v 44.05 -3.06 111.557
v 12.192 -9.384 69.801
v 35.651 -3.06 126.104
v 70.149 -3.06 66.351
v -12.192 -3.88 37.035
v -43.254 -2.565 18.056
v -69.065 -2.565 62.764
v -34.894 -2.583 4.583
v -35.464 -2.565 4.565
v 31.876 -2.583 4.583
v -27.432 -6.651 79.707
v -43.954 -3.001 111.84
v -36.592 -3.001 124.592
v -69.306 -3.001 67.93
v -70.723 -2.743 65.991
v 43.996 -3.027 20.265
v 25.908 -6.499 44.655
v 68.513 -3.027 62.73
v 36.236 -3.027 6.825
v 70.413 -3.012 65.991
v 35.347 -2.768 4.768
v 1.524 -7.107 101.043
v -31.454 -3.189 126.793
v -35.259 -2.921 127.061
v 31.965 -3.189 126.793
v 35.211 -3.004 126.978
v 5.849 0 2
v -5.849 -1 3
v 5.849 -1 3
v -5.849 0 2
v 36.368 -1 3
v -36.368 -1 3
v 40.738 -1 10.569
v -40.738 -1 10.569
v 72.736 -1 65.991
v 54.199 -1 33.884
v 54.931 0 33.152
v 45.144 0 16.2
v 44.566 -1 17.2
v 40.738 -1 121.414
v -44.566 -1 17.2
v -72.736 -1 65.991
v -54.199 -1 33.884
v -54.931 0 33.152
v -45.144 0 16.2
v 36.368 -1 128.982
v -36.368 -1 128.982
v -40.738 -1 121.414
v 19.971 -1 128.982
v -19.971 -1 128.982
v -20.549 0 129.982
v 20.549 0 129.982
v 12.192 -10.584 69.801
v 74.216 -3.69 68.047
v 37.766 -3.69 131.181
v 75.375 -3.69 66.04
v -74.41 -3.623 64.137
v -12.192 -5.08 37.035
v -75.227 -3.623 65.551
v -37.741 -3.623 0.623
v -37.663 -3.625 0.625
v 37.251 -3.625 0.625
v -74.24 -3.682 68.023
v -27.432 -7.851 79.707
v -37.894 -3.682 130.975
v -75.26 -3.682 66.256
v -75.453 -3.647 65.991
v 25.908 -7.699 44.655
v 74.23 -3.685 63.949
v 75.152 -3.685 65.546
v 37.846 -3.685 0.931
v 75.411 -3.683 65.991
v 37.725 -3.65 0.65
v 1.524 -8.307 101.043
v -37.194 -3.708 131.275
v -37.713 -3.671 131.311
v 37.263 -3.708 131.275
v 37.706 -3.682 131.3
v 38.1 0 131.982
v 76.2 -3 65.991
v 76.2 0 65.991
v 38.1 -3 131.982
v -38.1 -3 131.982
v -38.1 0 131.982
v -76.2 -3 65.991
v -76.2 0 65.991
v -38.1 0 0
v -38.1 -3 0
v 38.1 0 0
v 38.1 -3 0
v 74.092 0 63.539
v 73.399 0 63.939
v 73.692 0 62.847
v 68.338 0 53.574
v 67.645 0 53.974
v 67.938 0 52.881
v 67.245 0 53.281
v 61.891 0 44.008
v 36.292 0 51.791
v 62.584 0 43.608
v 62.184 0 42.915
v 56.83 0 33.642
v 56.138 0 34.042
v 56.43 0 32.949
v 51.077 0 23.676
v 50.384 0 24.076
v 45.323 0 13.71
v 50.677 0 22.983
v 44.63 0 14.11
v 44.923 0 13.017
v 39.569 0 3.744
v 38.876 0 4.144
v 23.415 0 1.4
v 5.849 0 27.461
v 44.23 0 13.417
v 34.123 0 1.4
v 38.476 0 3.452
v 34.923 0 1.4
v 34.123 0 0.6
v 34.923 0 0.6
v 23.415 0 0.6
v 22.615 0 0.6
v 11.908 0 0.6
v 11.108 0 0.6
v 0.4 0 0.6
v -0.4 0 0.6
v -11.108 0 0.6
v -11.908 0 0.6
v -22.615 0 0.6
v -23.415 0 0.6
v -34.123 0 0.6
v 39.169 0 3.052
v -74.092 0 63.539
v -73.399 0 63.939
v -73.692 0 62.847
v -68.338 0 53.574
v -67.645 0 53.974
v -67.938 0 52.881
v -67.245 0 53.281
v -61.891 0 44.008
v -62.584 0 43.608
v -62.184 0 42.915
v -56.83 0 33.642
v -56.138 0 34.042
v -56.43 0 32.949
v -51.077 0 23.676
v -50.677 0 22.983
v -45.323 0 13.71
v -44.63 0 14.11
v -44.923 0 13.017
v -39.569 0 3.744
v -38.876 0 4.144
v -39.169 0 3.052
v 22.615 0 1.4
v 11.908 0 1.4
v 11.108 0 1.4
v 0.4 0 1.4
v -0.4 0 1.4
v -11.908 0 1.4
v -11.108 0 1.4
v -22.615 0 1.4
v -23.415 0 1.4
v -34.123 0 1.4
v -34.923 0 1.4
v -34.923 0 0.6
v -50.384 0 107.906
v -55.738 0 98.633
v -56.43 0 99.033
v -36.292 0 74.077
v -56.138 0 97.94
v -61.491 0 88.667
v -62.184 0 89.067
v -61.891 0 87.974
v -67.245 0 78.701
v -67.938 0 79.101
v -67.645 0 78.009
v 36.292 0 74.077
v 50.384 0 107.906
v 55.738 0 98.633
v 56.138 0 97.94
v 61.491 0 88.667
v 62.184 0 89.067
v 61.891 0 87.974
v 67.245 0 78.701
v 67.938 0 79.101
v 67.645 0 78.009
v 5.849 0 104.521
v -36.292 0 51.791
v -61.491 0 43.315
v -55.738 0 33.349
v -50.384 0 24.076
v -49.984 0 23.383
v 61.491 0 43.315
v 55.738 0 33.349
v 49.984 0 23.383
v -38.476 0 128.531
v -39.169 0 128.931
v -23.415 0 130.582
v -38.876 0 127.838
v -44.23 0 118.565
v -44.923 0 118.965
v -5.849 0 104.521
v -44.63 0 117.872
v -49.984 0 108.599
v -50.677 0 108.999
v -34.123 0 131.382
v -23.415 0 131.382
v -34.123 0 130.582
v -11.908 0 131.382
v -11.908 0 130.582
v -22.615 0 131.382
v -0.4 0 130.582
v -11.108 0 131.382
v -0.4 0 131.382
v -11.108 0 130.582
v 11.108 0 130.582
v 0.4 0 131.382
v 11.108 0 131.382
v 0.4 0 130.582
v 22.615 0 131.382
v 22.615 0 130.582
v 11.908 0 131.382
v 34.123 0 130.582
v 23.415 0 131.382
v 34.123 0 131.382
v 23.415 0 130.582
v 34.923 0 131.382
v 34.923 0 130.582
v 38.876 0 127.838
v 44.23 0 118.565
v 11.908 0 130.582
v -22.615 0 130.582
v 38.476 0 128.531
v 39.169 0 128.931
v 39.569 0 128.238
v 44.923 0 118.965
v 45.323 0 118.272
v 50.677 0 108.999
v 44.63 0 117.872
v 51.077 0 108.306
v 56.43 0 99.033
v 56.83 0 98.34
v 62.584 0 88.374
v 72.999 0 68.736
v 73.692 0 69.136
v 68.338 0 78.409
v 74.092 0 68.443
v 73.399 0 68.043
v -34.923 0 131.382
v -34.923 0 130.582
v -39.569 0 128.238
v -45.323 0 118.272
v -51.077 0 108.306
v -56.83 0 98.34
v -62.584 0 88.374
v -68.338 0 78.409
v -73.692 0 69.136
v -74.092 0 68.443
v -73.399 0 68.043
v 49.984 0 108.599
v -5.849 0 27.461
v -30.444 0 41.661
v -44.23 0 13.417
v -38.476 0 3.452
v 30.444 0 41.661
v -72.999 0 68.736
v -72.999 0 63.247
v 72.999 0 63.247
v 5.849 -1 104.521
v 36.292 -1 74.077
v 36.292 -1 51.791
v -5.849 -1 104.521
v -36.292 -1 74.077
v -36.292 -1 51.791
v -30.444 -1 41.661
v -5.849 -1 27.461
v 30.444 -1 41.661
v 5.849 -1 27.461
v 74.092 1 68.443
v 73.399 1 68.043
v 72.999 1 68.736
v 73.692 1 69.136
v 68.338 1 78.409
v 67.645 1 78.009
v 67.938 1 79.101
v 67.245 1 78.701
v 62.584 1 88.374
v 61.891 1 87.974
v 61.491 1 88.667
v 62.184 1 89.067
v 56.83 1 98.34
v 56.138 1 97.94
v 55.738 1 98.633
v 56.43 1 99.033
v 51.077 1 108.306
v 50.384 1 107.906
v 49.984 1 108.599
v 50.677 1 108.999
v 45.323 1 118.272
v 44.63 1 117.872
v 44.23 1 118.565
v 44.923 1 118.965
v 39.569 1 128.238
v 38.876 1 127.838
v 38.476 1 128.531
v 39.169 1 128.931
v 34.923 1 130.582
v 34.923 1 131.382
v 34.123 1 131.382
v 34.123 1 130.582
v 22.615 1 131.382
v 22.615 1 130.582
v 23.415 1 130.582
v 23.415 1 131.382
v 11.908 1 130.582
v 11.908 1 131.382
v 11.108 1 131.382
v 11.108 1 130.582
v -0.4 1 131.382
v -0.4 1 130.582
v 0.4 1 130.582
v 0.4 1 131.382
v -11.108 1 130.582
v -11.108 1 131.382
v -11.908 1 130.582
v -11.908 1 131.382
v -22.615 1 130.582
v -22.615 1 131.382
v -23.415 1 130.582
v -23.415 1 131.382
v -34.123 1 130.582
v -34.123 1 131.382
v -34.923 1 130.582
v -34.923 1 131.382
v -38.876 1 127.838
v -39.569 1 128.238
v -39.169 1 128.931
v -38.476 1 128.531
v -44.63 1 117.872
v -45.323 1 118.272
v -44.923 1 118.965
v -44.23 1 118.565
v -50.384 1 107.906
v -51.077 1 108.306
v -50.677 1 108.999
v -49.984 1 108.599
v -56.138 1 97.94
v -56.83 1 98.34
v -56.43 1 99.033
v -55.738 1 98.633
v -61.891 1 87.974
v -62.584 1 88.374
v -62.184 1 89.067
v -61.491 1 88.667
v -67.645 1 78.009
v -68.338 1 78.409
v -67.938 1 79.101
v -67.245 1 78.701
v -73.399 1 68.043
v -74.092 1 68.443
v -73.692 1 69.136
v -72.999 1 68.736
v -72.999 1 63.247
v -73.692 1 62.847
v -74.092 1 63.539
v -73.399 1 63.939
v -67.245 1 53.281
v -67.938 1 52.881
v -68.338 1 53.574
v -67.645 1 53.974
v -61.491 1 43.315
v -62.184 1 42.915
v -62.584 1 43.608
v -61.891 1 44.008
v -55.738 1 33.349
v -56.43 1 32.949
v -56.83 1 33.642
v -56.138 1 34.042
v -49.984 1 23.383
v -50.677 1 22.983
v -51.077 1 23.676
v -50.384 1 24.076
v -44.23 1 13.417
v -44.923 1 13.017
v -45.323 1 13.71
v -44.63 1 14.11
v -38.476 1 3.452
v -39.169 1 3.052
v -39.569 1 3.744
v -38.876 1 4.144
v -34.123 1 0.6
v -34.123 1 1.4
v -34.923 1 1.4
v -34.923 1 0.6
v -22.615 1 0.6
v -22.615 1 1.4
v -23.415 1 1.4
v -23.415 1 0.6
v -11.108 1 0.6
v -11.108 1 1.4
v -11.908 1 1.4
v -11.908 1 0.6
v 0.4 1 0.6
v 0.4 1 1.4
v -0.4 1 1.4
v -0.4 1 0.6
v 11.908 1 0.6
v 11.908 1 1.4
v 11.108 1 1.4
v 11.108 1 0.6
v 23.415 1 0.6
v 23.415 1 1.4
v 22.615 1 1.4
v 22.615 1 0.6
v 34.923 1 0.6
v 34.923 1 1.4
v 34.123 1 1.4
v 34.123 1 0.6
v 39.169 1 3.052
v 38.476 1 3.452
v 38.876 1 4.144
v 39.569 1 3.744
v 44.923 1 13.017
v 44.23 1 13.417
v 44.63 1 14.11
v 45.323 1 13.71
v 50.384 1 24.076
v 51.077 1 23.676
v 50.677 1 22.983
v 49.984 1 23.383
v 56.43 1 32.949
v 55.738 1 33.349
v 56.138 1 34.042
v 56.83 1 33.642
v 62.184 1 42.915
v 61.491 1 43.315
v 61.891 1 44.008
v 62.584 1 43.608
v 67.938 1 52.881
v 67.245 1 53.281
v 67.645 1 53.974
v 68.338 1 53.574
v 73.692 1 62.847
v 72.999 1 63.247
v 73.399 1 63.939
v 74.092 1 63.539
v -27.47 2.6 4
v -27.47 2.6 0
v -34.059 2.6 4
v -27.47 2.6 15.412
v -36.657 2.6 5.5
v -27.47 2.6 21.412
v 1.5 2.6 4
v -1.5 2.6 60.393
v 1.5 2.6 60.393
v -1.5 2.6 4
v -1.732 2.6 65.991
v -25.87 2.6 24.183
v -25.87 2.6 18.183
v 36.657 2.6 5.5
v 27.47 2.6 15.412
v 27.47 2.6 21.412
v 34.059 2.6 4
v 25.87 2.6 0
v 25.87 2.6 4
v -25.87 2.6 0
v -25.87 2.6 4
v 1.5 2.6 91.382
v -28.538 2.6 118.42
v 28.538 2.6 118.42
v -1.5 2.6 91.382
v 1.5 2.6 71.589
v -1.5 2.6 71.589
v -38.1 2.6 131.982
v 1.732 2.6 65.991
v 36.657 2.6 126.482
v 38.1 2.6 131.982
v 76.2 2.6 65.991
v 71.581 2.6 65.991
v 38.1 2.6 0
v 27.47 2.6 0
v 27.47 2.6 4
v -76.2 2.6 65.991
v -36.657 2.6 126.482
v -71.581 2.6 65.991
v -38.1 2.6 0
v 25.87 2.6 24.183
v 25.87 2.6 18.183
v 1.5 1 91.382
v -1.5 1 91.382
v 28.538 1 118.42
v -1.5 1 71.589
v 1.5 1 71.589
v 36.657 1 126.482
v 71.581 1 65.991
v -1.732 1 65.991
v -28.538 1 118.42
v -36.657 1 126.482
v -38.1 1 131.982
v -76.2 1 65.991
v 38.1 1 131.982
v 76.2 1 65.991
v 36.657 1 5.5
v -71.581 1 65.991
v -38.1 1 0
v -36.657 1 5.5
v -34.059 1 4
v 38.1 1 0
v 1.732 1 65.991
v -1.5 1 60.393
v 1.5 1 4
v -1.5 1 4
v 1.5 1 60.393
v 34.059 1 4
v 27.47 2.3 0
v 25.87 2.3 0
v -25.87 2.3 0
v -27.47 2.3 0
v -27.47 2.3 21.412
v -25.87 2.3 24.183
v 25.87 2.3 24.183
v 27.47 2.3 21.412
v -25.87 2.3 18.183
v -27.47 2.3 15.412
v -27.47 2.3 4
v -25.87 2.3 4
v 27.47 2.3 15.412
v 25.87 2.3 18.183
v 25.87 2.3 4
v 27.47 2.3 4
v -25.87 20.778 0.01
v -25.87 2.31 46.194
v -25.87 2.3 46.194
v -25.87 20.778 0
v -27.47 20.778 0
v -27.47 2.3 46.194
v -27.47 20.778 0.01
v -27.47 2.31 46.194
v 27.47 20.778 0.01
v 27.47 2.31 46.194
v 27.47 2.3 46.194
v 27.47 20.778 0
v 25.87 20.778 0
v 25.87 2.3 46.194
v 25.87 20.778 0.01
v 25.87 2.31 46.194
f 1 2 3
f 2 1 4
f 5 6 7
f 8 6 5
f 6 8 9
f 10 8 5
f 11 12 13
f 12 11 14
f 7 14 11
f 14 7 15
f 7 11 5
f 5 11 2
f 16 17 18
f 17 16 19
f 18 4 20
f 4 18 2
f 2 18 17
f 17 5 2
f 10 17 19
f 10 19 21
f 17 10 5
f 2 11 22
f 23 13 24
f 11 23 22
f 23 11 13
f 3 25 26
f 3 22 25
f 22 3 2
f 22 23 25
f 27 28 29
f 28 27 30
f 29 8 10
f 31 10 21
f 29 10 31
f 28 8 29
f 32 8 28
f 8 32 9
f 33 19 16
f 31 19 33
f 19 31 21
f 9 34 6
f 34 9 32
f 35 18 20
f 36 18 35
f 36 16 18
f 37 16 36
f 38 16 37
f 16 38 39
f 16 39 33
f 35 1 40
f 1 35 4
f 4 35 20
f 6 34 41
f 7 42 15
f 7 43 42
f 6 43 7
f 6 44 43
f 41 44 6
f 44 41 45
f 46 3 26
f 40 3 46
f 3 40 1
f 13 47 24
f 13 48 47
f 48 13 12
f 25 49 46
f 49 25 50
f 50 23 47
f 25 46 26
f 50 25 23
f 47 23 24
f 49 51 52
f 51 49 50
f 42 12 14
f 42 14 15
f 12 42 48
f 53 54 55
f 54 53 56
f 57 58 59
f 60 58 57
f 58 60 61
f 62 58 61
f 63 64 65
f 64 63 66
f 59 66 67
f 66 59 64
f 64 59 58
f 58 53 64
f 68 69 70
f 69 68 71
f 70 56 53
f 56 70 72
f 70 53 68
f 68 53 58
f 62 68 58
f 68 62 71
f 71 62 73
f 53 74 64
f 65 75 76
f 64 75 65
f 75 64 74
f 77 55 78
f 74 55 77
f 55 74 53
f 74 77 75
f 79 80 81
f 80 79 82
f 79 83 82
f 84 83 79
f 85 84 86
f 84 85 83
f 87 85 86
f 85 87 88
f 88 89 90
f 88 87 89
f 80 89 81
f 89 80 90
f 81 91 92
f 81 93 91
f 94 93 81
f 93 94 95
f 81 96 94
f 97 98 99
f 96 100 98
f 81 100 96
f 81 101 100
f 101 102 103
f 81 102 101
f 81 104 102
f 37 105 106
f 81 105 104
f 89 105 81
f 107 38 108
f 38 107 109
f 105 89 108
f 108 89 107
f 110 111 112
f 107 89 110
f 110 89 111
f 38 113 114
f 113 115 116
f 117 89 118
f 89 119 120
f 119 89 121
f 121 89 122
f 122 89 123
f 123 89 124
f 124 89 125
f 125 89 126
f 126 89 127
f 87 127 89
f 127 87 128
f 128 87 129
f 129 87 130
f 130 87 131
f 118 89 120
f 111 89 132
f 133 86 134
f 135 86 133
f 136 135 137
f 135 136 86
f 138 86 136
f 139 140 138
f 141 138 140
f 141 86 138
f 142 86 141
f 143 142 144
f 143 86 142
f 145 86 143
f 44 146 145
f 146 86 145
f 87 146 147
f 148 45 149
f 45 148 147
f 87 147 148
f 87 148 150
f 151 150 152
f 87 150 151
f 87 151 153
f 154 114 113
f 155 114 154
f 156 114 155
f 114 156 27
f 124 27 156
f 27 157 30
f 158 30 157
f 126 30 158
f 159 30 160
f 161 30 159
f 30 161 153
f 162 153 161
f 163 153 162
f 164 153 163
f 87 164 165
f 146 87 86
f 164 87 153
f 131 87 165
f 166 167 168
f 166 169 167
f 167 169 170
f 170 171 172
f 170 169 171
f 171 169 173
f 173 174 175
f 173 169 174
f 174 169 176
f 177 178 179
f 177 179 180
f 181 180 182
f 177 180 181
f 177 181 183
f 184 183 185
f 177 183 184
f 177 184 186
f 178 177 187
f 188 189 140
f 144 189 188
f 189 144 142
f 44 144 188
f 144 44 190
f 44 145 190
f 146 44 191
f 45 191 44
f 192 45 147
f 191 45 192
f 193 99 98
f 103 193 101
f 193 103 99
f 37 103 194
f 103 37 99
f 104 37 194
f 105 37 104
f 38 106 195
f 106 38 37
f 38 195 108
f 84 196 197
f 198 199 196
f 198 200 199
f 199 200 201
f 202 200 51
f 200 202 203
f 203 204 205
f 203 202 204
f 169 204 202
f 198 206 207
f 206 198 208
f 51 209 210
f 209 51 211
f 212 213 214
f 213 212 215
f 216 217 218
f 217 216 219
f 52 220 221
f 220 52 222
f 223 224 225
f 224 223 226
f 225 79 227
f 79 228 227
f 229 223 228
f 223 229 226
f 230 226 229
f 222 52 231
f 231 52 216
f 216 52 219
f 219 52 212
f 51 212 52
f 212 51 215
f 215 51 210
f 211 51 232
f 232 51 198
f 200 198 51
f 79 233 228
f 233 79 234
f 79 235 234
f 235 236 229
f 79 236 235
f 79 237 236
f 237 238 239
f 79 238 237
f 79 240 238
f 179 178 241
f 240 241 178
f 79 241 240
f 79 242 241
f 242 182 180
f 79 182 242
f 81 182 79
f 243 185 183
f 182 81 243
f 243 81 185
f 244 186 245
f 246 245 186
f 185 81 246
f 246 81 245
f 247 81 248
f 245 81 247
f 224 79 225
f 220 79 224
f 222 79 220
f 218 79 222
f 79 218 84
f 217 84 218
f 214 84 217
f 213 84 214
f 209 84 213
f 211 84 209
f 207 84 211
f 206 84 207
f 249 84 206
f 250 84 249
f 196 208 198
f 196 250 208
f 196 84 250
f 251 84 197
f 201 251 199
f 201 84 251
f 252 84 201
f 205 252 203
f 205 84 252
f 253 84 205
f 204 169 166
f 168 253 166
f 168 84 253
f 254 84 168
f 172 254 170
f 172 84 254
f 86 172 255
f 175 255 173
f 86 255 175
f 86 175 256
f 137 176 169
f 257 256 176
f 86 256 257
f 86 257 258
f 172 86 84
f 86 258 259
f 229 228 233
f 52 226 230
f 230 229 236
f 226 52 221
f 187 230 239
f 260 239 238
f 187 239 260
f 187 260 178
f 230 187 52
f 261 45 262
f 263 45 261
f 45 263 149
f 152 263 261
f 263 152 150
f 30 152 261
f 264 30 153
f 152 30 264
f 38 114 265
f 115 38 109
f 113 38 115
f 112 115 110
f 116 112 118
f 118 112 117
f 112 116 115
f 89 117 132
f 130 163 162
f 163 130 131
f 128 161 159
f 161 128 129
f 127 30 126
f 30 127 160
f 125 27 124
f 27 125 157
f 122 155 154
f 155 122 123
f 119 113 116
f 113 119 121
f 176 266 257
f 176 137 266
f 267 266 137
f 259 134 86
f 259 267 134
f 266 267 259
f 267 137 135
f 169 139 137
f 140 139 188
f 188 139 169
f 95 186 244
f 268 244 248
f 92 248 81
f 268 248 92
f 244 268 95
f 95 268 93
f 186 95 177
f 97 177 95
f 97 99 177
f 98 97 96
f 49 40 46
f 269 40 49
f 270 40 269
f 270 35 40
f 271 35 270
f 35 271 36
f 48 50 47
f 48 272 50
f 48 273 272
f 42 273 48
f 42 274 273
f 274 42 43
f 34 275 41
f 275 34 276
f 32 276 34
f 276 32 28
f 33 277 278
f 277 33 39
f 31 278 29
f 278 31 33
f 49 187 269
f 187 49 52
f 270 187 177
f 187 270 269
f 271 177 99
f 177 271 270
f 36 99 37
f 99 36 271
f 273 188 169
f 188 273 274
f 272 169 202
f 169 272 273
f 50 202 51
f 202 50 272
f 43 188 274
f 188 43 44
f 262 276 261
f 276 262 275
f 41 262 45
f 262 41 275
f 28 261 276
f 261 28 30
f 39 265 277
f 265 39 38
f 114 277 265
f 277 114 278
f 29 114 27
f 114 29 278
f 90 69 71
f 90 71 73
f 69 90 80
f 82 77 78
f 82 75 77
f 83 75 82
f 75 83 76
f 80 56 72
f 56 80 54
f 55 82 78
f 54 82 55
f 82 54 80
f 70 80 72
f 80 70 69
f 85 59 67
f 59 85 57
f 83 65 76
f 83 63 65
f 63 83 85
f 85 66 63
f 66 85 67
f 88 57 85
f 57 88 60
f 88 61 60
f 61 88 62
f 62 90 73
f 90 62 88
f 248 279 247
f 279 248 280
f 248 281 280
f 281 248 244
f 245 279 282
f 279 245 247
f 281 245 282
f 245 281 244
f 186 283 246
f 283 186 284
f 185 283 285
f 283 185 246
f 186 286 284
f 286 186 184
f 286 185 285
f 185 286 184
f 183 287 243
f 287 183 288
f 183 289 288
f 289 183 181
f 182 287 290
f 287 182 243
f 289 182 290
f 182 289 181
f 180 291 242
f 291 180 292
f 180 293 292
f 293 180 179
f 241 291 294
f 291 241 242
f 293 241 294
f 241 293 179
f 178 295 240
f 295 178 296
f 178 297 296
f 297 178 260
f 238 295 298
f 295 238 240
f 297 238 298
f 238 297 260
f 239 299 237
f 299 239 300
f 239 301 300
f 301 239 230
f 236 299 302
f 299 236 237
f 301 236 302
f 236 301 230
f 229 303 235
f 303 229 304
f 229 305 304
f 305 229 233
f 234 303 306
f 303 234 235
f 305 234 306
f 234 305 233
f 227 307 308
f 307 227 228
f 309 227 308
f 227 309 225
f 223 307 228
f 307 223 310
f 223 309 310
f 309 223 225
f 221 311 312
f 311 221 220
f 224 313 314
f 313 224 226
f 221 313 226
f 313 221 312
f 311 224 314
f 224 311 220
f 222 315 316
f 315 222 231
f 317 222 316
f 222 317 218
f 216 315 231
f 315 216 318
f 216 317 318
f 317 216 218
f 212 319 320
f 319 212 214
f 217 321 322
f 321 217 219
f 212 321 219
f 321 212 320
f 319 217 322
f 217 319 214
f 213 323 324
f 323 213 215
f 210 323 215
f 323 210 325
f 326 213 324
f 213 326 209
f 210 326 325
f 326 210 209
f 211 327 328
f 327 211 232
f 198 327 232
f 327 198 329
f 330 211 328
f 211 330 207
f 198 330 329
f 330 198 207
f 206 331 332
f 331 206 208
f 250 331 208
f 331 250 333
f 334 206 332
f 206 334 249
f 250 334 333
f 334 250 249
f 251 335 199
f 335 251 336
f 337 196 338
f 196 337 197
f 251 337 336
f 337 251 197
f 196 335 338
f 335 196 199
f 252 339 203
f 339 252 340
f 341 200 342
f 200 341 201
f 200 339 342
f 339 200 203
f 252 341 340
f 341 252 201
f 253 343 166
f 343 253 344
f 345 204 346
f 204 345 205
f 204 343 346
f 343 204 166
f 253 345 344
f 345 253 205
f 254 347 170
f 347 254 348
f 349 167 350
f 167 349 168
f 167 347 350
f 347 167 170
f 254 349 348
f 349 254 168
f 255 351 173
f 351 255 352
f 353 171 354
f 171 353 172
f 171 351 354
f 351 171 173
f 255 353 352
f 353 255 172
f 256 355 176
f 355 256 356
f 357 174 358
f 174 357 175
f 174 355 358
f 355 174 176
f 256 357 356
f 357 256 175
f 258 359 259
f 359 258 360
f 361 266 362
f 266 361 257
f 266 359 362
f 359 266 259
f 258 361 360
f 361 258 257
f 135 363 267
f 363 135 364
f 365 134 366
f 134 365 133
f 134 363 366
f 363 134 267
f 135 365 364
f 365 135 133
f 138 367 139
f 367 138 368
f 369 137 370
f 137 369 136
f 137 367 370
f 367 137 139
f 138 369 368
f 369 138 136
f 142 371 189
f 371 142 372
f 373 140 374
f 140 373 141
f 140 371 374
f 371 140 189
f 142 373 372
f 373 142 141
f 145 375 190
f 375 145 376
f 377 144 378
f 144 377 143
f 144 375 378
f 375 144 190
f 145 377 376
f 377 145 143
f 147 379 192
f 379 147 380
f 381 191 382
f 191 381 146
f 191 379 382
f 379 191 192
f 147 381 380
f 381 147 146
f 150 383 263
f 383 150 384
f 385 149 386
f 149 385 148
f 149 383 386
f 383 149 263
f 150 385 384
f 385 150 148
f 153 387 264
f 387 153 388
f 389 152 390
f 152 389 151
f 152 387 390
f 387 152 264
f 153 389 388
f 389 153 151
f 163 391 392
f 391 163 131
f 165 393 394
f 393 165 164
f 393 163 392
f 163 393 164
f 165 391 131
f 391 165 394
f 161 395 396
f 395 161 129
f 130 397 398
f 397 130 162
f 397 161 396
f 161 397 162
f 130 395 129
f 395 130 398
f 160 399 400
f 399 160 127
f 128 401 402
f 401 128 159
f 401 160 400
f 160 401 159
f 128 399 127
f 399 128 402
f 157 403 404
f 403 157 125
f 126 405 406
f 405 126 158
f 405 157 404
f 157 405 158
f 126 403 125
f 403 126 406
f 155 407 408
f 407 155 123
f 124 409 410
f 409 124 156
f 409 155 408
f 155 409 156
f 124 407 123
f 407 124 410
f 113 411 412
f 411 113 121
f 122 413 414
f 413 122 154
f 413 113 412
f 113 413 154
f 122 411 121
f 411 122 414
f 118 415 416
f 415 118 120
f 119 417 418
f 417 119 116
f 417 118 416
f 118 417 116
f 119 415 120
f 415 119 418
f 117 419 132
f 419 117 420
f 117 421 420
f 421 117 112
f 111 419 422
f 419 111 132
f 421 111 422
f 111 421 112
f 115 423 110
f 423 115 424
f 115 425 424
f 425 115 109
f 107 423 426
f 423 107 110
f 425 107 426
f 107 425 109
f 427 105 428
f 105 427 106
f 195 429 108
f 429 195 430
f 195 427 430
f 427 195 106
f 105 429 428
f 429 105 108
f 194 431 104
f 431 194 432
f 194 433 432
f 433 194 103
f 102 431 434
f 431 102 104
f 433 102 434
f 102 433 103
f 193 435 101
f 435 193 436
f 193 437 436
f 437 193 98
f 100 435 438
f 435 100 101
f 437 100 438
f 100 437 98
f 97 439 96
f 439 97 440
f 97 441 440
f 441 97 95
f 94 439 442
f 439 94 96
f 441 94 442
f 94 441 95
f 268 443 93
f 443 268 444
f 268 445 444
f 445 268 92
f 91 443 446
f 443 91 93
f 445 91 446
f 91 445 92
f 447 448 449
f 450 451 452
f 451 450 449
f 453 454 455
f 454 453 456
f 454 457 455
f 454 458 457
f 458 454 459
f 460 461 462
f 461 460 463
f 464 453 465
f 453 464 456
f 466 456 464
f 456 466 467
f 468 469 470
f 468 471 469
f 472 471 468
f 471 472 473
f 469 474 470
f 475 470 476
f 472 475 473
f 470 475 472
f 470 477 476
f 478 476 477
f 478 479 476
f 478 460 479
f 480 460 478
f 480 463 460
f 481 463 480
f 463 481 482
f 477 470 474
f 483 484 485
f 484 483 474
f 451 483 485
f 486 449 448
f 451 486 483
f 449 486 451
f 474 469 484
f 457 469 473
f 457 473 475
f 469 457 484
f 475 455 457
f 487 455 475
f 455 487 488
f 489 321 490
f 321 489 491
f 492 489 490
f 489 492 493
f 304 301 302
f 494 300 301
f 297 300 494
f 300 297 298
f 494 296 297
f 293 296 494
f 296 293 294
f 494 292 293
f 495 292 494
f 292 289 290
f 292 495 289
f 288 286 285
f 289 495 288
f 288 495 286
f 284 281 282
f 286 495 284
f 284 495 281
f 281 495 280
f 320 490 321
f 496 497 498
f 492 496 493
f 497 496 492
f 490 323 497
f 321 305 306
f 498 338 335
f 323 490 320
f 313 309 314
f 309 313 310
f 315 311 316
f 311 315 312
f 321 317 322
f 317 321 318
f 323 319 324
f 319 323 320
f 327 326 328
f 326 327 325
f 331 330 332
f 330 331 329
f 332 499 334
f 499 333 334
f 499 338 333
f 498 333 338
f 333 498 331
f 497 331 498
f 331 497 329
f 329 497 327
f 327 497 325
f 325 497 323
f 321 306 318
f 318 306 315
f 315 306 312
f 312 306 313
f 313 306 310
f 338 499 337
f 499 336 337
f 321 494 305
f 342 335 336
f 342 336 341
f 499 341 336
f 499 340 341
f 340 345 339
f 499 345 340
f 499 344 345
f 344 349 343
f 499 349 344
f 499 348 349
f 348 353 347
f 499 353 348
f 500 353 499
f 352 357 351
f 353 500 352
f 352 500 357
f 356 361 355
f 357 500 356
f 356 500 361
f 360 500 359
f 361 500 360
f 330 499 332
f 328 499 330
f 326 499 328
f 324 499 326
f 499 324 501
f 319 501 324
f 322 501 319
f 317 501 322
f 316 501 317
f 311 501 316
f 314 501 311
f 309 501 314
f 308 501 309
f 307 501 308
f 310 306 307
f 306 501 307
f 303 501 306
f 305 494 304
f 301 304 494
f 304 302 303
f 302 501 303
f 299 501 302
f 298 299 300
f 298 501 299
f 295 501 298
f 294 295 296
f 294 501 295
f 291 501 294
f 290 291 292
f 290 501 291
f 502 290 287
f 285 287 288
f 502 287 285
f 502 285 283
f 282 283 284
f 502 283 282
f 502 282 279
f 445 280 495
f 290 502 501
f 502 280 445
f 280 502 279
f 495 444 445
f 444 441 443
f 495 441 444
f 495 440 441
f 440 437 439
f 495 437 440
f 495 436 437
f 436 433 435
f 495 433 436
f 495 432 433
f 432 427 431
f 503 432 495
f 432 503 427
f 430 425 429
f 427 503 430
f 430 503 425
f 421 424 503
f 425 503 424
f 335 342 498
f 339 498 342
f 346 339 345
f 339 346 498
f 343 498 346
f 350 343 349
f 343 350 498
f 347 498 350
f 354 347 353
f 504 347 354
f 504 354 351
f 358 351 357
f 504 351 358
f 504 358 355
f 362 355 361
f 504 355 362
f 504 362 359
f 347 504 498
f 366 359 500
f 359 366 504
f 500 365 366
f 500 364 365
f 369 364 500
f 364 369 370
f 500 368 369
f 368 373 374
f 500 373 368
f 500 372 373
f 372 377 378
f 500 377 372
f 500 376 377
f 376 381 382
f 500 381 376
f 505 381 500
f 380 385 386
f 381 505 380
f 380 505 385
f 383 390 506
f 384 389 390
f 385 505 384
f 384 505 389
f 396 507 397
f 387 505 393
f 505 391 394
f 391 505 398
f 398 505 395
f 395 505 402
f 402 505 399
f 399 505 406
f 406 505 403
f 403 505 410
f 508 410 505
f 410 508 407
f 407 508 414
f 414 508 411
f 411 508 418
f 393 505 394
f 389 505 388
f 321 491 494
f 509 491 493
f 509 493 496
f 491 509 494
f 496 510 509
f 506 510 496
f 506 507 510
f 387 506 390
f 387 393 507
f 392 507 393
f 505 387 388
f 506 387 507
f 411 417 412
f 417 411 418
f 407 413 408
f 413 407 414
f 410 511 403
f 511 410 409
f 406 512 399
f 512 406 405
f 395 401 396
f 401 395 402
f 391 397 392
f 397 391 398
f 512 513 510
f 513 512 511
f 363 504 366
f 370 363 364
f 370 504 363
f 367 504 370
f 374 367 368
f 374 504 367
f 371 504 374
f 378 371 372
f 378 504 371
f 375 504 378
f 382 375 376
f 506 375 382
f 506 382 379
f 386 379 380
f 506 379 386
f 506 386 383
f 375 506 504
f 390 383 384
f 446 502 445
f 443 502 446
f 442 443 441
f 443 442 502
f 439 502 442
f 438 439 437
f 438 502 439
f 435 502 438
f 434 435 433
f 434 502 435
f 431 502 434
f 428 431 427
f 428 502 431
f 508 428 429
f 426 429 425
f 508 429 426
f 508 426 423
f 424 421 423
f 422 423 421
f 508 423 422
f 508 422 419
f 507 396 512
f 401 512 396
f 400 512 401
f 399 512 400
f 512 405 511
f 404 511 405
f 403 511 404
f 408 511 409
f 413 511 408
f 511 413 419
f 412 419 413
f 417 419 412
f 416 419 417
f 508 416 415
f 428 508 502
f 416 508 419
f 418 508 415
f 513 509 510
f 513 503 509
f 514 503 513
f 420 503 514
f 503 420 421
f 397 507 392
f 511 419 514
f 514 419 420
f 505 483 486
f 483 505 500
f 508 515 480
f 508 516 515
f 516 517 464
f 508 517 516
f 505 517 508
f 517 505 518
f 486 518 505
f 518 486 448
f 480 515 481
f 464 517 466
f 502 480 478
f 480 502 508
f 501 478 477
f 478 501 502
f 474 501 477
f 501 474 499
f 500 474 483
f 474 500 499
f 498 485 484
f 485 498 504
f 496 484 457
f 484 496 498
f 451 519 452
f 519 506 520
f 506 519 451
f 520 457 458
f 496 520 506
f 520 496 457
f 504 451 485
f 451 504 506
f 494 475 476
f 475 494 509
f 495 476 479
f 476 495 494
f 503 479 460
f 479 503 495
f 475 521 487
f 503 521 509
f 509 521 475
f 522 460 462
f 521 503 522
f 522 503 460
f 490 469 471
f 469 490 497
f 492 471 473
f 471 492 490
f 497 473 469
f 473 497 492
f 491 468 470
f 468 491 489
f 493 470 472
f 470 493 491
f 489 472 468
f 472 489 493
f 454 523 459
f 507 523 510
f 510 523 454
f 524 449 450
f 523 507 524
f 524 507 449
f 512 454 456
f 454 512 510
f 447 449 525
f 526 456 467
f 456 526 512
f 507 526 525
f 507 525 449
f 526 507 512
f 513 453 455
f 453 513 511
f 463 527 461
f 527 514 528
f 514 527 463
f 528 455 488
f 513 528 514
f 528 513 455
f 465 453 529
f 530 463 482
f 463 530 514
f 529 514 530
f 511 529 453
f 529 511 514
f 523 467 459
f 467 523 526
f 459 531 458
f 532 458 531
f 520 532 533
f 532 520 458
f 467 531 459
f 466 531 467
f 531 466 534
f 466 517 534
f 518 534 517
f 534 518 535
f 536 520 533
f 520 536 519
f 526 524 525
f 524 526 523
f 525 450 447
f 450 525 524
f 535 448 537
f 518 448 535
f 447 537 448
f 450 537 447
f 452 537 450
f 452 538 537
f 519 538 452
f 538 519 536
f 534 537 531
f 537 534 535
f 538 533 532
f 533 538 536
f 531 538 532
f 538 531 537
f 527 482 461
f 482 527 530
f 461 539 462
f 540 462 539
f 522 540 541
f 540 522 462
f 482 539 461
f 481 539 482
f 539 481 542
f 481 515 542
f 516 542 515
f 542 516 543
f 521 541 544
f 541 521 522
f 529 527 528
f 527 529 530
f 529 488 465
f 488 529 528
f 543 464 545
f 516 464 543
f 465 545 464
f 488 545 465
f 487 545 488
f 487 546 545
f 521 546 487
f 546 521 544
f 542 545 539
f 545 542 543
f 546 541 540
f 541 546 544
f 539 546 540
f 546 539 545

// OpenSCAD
// Hexagon wall tile v38 — parametric rebuild of v30
// Front: identical low-poly facets to v30 (same facet angles at every size).
// Edge profile: identical on every size (edge depth, rim width) so tiles butt flush.
// Back: six corner pads for 1" (25 mm) double-sided mounting tape.
// v32: tape pads are flat plates hung from the rim with an air gap to the front skin.
// v33: thinner skin + thinner pads so the air gap is 1.4 mm even right at the edges
//      (v32 had only 0.8 mm there and showed marks along the slanted edges).
// v34: snap-off stabilizer fins behind the bottom edge so the tall, thin tile can't tip over
//      while printing. Break them off afterwards (bend sideways) and the back stays flat.
// v35: 0.6 mm 45° chamfer on the front edge (crisp, consistent shadow line between tiles; hides
//      first-layer squish and brim trim marks) + relief_scale to deepen the facets if wanted.
// v37: much smaller breakaway tabs (0.8 x 0.6 mm, every 8 mm) so the fins snap off easily.
// v38: full-height snap-off BRACE FRAME behind the tile: a thin hex ring + X/vertical bars,
//      1 mm behind the back, tied to the tile rim by tiny tabs all the way round (incl. the top).
//      Tile + brace act as a stiff box while printing; the fins now sit on the brace.
//      Peel the brace off after printing — the tabs only touch the back rim.
// Prints upright on a flat edge with NO supports (every downward edge is 45° or steeper).
//
// Export one size at a time, e.g.:
//   openscad -D size_in=6 -o hex_tile_v38_6in.stl hex_wall_tile_v38.scad

/* [Size] */
size_in       = 6;      // point-to-point width in inches (3, 6, 10 ...)

/* [Edge profile — keep identical across sizes] */
// Space behind the skin at the edge = edge_depth - skin; it must be >= pad_plate + pad_gap + pad_recess.
edge_depth    = 3.6;    // depth of the outer edge, back plane to front face (mm)
rim           = 2.0;    // perimeter wall thickness at the back plane (mm)
front_chamfer = 0.6;    // 45° chamfer on the front edge (mm); 0 = sharp edge

/* [Look] */
relief_scale  = 1.0;    // 1.0 = v30 facets; 1.5 = 50% deeper facets (same edge profile on all sizes)

/* [Front skin] */
skin          = 1.2;    // front skin thickness (mm) — 3 lines at 0.4 mm, same on all sizes

/* [Tape pads] */
tape_width    = 25.4;   // tape width (mm)
pad_margin    = 3;      // extra pad width beyond the tape (mm)
pad_max_frac  = 0.45;   // pad never larger than this fraction of the tile radius (keeps 3" usable)
pad_plate     = 1.0;    // thickness of the pad plates (mm)
pad_gap       = 1.4;    // minimum air gap between pads and the front skin (mm) — keeps the front clean
pad_recess    = 0;      // pads set back from the rim (mm); >0 lets the rim touch the wall,
                        // but near the edges the plate is then trimmed thinner to keep pad_gap

/* [Print stabilizers (snap off after printing)] */
stabilizers   = true;
fin_count     = 2;      // fins behind the bottom edge, placed symmetrically
fin_thick     = 1.6;    // fin thickness (mm)
fin_height_frac = 0.35; // fin height as a fraction of the tile height
fin_depth_frac  = 0.4;  // fin depth behind the brace as a fraction of fin height
fin_depth_min   = 15;   // (mm)
fin_gap       = 0.5;    // air gap between fin and tile back (mm)
tab_height    = 0.6;    // breakaway tab height (mm, vertical when printing) — 3 layers at 0.2
tab_width     = 0.8;    // breakaway tab width (mm), centred on the fin — 2 lines
tab_pitch     = 8;      // spacing between tabs (mm)

/* [Full-height brace frame (snap off after printing)] */
brace         = true;
brace_gap     = 1.0;    // air gap between tile back and brace (mm)
brace_thick   = 1.6;    // brace thickness (mm)
brace_rim_w   = 4;      // width of the brace's hex ring (mm)
brace_bar_w   = 3;      // width of the X and vertical bars (mm)
brace_tab_pitch = 10;   // spacing of brace tabs along each rim side (mm)
brace_tab     = 0.8;    // brace tab size (mm) — tiny, so the brace peels off

/* [Output] */
orient_for_print = true; // stand upright on a flat edge, back facing +Y

/* [Hidden] */
R   = size_in * 25.4 / 2;         // corner radius
AP  = R * cos(30);                // apothem
PAD = min(tape_width + pad_margin, R * pad_max_frac);

// Normalised front geometry from v30 (x, y in units of R; z = relief above edge, units of R)
FP = [[1,0,0],[0.5,0.866025,0],[-0.5,0.866025,0],[-1,0,0],[-0.5,-0.866025,0],[0.5,-0.866025,0],
      [0.16,0.05,0.091654],[-0.16,-0.38,0.019428],[-0.36,0.18,0.05579],[0.34,-0.28,0.053795],[0.02,0.46,0.061766]];
FACES = [[0,6,1],[4,3,7],[5,4,7],[8,3,2],[7,3,8],[7,8,6],[5,9,0],[9,6,0],[9,7,6],[5,7,9],
         [6,8,10],[8,2,10],[6,10,1],[10,2,1],
         [1,12,11,0],[2,13,12,1],[3,14,13,2],[4,15,14,3],[5,16,15,4],[0,11,16,5],
         [11,12,13,14,15,16]];
RELIEF_MAX = 0.091654 * R * relief_scale;
D = edge_depth + RELIEF_MAX + 1;  // max depth used for chamfers

// Solid bounded by the faceted front (shifted by dz) and a flat back at z = zb
module body(dz = 0, zb = 0) {
    pts = concat(
        [for (p = FP) [p[0]*R, p[1]*R, edge_depth + p[2]*R*relief_scale + dz]],
        [for (i = [0:5]) [FP[i][0]*R, FP[i][1]*R, zb]]);
    polyhedron(points = pts, faces = FACES, convexity = 4);
}

module hex2d(apothem) { circle(r = apothem / cos(30), $fn = 6); }

// Back cavity: behind the skin, inside the rim; rim inner faces slope 45° so nothing needs support
module cavity(extra = 0) {
    H  = D + 2;
    a0 = AP - rim - extra + 1;             // apothem at z = -1
    intersection() {
        body(dz = -skin - extra, zb = -1);
        translate([0, 0, -1]) linear_extrude(height = H, scale = (a0 - H) / a0) hex2d(a0);
    }
}

// Corner pad footprint (2D), k = corner index 0..5:
// the corner region of the inner hex, PAD wide, long enough to hold a PAD x PAD square of tape
module pad_core(k) {
    U0  = (AP - rim) / cos(30);                    // inner corner distance from centre
    LEN = PAD / (2 * tan(60)) + PAD + 1;           // apex taper + full square + margin
    intersection() {
        hex2d(AP - rim + 0.3);                     // overlap 0.3 mm into the rim to fuse
        rotate(60 * k) translate([U0 - LEN, -PAD / 2]) square([LEN + 5, PAD]);
    }
}

// In-plane self-support: printed upright, a vertical plate needs every downward edge at >= 45°.
// Sweep each pad toward the nearest rim side below it at 45° (or straight down for bottom corners).
SWEEP = [[1, -1], [1, -1], [-1, -1], [-1, -1], [0, -1], [0, -1]];
module pad_fp(k) {
    intersection() {
        hex2d(AP - rim + 0.3);
        hull() { pad_core(k); translate(SWEEP[k] * R) pad_core(k); }
    }
}

module pads() {
    intersection() {
        body(dz = -skin - pad_gap, zb = -1);       // never closer than pad_gap to the skin
        translate([0, 0, pad_recess]) linear_extrude(pad_plate) for (k = [0:5]) pad_fp(k);
    }
}

module chamfer_clip() {
    HB = D + 5;
    union() {
        translate([0, 0, -2]) linear_extrude(edge_depth - front_chamfer + 2) hex2d(AP + 1);
        translate([0, 0, edge_depth - front_chamfer]) linear_extrude(height = HB, scale = (AP - HB) / AP) hex2d(AP);
    }
}

module tile() {
    intersection() {
        union() {
            difference() { body(); cavity(); }
            pads();
        }
        if (front_chamfer > 0) chamfer_clip(); else translate([-2*R, -2*R, -5]) cube([4*R, 4*R, 4*R]);
    }
}

// Triangular fins standing on the bed behind the back (model z < 0), joined to the tile by small tabs
FIN_H = fin_height_frac * 2 * AP;
FIN_L = max(fin_depth_min, fin_depth_frac * FIN_H);
function fin_x(i) = (fin_count == 1) ? 0 : (-1 + 2 * i / (fin_count - 1)) * 0.35 * R;
BZ = brace ? brace_gap + brace_thick : 0;          // fins start behind the brace when it is used
module stabilizer_fins() {
    for (i = [0 : fin_count - 1]) {
        x = fin_x(i);
        fg = brace ? BZ - 0.3 : fin_gap;                // with a brace: fused into it (no tabs needed)
        hull() {                                            // fin: vertical triangle
            translate([x - fin_thick/2, -AP, -fg - FIN_L]) cube([fin_thick, 0.01, FIN_L]);
            translate([x - fin_thick/2, -AP, -fg - 0.01]) cube([fin_thick, FIN_H, 0.01]);
        }
        if (!brace)
            for (y = [0 : tab_pitch : FIN_H - tab_height])  // breakaway tabs into the back plane
                translate([x - tab_width/2, -AP + y, -fin_gap - 0.05]) cube([tab_width, tab_height, fin_gap + 0.35]);
    }
}

// Brace frame (2D, in the tile plane). Printed upright, so every downward-facing edge is >= 45°:
// the top bar is carried by 45° roofs in the two top windows; bars run vertical or at ±60°.
module brace_2d() {
    W  = brace_rim_w;
    Yt = AP - W;                                        // underside of the top ring bar
    difference() {
        hex2d(AP);
        intersection() {                                // the open window, with a 45° roof under the top bar
            hex2d(AP - W);
            // only the two top windows touch the top bar: give them a 45° valley roof
            polygon([[-2*R, -2*R], [2*R, -2*R], [2*R, 2*R], [R/2, 2*R], [R/2, Yt],
                     [0, Yt - R/2], [-R/2, Yt], [-R/2, 2*R], [-2*R, 2*R]]);
        }
    }
    intersection() {
        hex2d(AP);
        union() {
            square([brace_bar_w, 2*AP], center = true);                 // vertical bar
            rotate(60)  square([4*R, brace_bar_w], center = true);      // ±60° diagonals (corner to corner)
            rotate(-60) square([4*R, brace_bar_w], center = true);
        }
    }
}

module brace_frame() {
    translate([0, 0, -BZ]) linear_extrude(brace_thick) brace_2d();
    // tiny tabs across the gap, on the tile's back rim (1 mm in from the outline), all six sides
    for (k = [0:5]) {
        a0 = 60*k; a1 = 60*(k+1);
        p0 = [ (R - 1/sin(60)) * cos(a0), (R - 1/sin(60)) * sin(a0) ];
        p1 = [ (R - 1/sin(60)) * cos(a1), (R - 1/sin(60)) * sin(a1) ];
        L  = norm(p1 - p0);
        n  = floor((L - 6) / brace_tab_pitch);
        for (j = [0 : n]) {
            t = (3 + j * (L - 6) / max(n, 1)) / L;
            p = p0 + t * (p1 - p0);
            translate([p[0], p[1], -brace_gap - 0.3]) rotate(a0 + 120)
                translate([-brace_tab/2, -brace_tab/2, 0]) cube([brace_tab, brace_tab, brace_gap + 0.6]);
        }
    }
}

if (orient_for_print)
    translate([0, 0, AP]) rotate([90, 0, 0]) { tile(); if (brace) brace_frame(); if (stabilizers) stabilizer_fins(); }
else
    { tile(); if (brace) brace_frame(); if (stabilizers) stabilizer_fins(); }
